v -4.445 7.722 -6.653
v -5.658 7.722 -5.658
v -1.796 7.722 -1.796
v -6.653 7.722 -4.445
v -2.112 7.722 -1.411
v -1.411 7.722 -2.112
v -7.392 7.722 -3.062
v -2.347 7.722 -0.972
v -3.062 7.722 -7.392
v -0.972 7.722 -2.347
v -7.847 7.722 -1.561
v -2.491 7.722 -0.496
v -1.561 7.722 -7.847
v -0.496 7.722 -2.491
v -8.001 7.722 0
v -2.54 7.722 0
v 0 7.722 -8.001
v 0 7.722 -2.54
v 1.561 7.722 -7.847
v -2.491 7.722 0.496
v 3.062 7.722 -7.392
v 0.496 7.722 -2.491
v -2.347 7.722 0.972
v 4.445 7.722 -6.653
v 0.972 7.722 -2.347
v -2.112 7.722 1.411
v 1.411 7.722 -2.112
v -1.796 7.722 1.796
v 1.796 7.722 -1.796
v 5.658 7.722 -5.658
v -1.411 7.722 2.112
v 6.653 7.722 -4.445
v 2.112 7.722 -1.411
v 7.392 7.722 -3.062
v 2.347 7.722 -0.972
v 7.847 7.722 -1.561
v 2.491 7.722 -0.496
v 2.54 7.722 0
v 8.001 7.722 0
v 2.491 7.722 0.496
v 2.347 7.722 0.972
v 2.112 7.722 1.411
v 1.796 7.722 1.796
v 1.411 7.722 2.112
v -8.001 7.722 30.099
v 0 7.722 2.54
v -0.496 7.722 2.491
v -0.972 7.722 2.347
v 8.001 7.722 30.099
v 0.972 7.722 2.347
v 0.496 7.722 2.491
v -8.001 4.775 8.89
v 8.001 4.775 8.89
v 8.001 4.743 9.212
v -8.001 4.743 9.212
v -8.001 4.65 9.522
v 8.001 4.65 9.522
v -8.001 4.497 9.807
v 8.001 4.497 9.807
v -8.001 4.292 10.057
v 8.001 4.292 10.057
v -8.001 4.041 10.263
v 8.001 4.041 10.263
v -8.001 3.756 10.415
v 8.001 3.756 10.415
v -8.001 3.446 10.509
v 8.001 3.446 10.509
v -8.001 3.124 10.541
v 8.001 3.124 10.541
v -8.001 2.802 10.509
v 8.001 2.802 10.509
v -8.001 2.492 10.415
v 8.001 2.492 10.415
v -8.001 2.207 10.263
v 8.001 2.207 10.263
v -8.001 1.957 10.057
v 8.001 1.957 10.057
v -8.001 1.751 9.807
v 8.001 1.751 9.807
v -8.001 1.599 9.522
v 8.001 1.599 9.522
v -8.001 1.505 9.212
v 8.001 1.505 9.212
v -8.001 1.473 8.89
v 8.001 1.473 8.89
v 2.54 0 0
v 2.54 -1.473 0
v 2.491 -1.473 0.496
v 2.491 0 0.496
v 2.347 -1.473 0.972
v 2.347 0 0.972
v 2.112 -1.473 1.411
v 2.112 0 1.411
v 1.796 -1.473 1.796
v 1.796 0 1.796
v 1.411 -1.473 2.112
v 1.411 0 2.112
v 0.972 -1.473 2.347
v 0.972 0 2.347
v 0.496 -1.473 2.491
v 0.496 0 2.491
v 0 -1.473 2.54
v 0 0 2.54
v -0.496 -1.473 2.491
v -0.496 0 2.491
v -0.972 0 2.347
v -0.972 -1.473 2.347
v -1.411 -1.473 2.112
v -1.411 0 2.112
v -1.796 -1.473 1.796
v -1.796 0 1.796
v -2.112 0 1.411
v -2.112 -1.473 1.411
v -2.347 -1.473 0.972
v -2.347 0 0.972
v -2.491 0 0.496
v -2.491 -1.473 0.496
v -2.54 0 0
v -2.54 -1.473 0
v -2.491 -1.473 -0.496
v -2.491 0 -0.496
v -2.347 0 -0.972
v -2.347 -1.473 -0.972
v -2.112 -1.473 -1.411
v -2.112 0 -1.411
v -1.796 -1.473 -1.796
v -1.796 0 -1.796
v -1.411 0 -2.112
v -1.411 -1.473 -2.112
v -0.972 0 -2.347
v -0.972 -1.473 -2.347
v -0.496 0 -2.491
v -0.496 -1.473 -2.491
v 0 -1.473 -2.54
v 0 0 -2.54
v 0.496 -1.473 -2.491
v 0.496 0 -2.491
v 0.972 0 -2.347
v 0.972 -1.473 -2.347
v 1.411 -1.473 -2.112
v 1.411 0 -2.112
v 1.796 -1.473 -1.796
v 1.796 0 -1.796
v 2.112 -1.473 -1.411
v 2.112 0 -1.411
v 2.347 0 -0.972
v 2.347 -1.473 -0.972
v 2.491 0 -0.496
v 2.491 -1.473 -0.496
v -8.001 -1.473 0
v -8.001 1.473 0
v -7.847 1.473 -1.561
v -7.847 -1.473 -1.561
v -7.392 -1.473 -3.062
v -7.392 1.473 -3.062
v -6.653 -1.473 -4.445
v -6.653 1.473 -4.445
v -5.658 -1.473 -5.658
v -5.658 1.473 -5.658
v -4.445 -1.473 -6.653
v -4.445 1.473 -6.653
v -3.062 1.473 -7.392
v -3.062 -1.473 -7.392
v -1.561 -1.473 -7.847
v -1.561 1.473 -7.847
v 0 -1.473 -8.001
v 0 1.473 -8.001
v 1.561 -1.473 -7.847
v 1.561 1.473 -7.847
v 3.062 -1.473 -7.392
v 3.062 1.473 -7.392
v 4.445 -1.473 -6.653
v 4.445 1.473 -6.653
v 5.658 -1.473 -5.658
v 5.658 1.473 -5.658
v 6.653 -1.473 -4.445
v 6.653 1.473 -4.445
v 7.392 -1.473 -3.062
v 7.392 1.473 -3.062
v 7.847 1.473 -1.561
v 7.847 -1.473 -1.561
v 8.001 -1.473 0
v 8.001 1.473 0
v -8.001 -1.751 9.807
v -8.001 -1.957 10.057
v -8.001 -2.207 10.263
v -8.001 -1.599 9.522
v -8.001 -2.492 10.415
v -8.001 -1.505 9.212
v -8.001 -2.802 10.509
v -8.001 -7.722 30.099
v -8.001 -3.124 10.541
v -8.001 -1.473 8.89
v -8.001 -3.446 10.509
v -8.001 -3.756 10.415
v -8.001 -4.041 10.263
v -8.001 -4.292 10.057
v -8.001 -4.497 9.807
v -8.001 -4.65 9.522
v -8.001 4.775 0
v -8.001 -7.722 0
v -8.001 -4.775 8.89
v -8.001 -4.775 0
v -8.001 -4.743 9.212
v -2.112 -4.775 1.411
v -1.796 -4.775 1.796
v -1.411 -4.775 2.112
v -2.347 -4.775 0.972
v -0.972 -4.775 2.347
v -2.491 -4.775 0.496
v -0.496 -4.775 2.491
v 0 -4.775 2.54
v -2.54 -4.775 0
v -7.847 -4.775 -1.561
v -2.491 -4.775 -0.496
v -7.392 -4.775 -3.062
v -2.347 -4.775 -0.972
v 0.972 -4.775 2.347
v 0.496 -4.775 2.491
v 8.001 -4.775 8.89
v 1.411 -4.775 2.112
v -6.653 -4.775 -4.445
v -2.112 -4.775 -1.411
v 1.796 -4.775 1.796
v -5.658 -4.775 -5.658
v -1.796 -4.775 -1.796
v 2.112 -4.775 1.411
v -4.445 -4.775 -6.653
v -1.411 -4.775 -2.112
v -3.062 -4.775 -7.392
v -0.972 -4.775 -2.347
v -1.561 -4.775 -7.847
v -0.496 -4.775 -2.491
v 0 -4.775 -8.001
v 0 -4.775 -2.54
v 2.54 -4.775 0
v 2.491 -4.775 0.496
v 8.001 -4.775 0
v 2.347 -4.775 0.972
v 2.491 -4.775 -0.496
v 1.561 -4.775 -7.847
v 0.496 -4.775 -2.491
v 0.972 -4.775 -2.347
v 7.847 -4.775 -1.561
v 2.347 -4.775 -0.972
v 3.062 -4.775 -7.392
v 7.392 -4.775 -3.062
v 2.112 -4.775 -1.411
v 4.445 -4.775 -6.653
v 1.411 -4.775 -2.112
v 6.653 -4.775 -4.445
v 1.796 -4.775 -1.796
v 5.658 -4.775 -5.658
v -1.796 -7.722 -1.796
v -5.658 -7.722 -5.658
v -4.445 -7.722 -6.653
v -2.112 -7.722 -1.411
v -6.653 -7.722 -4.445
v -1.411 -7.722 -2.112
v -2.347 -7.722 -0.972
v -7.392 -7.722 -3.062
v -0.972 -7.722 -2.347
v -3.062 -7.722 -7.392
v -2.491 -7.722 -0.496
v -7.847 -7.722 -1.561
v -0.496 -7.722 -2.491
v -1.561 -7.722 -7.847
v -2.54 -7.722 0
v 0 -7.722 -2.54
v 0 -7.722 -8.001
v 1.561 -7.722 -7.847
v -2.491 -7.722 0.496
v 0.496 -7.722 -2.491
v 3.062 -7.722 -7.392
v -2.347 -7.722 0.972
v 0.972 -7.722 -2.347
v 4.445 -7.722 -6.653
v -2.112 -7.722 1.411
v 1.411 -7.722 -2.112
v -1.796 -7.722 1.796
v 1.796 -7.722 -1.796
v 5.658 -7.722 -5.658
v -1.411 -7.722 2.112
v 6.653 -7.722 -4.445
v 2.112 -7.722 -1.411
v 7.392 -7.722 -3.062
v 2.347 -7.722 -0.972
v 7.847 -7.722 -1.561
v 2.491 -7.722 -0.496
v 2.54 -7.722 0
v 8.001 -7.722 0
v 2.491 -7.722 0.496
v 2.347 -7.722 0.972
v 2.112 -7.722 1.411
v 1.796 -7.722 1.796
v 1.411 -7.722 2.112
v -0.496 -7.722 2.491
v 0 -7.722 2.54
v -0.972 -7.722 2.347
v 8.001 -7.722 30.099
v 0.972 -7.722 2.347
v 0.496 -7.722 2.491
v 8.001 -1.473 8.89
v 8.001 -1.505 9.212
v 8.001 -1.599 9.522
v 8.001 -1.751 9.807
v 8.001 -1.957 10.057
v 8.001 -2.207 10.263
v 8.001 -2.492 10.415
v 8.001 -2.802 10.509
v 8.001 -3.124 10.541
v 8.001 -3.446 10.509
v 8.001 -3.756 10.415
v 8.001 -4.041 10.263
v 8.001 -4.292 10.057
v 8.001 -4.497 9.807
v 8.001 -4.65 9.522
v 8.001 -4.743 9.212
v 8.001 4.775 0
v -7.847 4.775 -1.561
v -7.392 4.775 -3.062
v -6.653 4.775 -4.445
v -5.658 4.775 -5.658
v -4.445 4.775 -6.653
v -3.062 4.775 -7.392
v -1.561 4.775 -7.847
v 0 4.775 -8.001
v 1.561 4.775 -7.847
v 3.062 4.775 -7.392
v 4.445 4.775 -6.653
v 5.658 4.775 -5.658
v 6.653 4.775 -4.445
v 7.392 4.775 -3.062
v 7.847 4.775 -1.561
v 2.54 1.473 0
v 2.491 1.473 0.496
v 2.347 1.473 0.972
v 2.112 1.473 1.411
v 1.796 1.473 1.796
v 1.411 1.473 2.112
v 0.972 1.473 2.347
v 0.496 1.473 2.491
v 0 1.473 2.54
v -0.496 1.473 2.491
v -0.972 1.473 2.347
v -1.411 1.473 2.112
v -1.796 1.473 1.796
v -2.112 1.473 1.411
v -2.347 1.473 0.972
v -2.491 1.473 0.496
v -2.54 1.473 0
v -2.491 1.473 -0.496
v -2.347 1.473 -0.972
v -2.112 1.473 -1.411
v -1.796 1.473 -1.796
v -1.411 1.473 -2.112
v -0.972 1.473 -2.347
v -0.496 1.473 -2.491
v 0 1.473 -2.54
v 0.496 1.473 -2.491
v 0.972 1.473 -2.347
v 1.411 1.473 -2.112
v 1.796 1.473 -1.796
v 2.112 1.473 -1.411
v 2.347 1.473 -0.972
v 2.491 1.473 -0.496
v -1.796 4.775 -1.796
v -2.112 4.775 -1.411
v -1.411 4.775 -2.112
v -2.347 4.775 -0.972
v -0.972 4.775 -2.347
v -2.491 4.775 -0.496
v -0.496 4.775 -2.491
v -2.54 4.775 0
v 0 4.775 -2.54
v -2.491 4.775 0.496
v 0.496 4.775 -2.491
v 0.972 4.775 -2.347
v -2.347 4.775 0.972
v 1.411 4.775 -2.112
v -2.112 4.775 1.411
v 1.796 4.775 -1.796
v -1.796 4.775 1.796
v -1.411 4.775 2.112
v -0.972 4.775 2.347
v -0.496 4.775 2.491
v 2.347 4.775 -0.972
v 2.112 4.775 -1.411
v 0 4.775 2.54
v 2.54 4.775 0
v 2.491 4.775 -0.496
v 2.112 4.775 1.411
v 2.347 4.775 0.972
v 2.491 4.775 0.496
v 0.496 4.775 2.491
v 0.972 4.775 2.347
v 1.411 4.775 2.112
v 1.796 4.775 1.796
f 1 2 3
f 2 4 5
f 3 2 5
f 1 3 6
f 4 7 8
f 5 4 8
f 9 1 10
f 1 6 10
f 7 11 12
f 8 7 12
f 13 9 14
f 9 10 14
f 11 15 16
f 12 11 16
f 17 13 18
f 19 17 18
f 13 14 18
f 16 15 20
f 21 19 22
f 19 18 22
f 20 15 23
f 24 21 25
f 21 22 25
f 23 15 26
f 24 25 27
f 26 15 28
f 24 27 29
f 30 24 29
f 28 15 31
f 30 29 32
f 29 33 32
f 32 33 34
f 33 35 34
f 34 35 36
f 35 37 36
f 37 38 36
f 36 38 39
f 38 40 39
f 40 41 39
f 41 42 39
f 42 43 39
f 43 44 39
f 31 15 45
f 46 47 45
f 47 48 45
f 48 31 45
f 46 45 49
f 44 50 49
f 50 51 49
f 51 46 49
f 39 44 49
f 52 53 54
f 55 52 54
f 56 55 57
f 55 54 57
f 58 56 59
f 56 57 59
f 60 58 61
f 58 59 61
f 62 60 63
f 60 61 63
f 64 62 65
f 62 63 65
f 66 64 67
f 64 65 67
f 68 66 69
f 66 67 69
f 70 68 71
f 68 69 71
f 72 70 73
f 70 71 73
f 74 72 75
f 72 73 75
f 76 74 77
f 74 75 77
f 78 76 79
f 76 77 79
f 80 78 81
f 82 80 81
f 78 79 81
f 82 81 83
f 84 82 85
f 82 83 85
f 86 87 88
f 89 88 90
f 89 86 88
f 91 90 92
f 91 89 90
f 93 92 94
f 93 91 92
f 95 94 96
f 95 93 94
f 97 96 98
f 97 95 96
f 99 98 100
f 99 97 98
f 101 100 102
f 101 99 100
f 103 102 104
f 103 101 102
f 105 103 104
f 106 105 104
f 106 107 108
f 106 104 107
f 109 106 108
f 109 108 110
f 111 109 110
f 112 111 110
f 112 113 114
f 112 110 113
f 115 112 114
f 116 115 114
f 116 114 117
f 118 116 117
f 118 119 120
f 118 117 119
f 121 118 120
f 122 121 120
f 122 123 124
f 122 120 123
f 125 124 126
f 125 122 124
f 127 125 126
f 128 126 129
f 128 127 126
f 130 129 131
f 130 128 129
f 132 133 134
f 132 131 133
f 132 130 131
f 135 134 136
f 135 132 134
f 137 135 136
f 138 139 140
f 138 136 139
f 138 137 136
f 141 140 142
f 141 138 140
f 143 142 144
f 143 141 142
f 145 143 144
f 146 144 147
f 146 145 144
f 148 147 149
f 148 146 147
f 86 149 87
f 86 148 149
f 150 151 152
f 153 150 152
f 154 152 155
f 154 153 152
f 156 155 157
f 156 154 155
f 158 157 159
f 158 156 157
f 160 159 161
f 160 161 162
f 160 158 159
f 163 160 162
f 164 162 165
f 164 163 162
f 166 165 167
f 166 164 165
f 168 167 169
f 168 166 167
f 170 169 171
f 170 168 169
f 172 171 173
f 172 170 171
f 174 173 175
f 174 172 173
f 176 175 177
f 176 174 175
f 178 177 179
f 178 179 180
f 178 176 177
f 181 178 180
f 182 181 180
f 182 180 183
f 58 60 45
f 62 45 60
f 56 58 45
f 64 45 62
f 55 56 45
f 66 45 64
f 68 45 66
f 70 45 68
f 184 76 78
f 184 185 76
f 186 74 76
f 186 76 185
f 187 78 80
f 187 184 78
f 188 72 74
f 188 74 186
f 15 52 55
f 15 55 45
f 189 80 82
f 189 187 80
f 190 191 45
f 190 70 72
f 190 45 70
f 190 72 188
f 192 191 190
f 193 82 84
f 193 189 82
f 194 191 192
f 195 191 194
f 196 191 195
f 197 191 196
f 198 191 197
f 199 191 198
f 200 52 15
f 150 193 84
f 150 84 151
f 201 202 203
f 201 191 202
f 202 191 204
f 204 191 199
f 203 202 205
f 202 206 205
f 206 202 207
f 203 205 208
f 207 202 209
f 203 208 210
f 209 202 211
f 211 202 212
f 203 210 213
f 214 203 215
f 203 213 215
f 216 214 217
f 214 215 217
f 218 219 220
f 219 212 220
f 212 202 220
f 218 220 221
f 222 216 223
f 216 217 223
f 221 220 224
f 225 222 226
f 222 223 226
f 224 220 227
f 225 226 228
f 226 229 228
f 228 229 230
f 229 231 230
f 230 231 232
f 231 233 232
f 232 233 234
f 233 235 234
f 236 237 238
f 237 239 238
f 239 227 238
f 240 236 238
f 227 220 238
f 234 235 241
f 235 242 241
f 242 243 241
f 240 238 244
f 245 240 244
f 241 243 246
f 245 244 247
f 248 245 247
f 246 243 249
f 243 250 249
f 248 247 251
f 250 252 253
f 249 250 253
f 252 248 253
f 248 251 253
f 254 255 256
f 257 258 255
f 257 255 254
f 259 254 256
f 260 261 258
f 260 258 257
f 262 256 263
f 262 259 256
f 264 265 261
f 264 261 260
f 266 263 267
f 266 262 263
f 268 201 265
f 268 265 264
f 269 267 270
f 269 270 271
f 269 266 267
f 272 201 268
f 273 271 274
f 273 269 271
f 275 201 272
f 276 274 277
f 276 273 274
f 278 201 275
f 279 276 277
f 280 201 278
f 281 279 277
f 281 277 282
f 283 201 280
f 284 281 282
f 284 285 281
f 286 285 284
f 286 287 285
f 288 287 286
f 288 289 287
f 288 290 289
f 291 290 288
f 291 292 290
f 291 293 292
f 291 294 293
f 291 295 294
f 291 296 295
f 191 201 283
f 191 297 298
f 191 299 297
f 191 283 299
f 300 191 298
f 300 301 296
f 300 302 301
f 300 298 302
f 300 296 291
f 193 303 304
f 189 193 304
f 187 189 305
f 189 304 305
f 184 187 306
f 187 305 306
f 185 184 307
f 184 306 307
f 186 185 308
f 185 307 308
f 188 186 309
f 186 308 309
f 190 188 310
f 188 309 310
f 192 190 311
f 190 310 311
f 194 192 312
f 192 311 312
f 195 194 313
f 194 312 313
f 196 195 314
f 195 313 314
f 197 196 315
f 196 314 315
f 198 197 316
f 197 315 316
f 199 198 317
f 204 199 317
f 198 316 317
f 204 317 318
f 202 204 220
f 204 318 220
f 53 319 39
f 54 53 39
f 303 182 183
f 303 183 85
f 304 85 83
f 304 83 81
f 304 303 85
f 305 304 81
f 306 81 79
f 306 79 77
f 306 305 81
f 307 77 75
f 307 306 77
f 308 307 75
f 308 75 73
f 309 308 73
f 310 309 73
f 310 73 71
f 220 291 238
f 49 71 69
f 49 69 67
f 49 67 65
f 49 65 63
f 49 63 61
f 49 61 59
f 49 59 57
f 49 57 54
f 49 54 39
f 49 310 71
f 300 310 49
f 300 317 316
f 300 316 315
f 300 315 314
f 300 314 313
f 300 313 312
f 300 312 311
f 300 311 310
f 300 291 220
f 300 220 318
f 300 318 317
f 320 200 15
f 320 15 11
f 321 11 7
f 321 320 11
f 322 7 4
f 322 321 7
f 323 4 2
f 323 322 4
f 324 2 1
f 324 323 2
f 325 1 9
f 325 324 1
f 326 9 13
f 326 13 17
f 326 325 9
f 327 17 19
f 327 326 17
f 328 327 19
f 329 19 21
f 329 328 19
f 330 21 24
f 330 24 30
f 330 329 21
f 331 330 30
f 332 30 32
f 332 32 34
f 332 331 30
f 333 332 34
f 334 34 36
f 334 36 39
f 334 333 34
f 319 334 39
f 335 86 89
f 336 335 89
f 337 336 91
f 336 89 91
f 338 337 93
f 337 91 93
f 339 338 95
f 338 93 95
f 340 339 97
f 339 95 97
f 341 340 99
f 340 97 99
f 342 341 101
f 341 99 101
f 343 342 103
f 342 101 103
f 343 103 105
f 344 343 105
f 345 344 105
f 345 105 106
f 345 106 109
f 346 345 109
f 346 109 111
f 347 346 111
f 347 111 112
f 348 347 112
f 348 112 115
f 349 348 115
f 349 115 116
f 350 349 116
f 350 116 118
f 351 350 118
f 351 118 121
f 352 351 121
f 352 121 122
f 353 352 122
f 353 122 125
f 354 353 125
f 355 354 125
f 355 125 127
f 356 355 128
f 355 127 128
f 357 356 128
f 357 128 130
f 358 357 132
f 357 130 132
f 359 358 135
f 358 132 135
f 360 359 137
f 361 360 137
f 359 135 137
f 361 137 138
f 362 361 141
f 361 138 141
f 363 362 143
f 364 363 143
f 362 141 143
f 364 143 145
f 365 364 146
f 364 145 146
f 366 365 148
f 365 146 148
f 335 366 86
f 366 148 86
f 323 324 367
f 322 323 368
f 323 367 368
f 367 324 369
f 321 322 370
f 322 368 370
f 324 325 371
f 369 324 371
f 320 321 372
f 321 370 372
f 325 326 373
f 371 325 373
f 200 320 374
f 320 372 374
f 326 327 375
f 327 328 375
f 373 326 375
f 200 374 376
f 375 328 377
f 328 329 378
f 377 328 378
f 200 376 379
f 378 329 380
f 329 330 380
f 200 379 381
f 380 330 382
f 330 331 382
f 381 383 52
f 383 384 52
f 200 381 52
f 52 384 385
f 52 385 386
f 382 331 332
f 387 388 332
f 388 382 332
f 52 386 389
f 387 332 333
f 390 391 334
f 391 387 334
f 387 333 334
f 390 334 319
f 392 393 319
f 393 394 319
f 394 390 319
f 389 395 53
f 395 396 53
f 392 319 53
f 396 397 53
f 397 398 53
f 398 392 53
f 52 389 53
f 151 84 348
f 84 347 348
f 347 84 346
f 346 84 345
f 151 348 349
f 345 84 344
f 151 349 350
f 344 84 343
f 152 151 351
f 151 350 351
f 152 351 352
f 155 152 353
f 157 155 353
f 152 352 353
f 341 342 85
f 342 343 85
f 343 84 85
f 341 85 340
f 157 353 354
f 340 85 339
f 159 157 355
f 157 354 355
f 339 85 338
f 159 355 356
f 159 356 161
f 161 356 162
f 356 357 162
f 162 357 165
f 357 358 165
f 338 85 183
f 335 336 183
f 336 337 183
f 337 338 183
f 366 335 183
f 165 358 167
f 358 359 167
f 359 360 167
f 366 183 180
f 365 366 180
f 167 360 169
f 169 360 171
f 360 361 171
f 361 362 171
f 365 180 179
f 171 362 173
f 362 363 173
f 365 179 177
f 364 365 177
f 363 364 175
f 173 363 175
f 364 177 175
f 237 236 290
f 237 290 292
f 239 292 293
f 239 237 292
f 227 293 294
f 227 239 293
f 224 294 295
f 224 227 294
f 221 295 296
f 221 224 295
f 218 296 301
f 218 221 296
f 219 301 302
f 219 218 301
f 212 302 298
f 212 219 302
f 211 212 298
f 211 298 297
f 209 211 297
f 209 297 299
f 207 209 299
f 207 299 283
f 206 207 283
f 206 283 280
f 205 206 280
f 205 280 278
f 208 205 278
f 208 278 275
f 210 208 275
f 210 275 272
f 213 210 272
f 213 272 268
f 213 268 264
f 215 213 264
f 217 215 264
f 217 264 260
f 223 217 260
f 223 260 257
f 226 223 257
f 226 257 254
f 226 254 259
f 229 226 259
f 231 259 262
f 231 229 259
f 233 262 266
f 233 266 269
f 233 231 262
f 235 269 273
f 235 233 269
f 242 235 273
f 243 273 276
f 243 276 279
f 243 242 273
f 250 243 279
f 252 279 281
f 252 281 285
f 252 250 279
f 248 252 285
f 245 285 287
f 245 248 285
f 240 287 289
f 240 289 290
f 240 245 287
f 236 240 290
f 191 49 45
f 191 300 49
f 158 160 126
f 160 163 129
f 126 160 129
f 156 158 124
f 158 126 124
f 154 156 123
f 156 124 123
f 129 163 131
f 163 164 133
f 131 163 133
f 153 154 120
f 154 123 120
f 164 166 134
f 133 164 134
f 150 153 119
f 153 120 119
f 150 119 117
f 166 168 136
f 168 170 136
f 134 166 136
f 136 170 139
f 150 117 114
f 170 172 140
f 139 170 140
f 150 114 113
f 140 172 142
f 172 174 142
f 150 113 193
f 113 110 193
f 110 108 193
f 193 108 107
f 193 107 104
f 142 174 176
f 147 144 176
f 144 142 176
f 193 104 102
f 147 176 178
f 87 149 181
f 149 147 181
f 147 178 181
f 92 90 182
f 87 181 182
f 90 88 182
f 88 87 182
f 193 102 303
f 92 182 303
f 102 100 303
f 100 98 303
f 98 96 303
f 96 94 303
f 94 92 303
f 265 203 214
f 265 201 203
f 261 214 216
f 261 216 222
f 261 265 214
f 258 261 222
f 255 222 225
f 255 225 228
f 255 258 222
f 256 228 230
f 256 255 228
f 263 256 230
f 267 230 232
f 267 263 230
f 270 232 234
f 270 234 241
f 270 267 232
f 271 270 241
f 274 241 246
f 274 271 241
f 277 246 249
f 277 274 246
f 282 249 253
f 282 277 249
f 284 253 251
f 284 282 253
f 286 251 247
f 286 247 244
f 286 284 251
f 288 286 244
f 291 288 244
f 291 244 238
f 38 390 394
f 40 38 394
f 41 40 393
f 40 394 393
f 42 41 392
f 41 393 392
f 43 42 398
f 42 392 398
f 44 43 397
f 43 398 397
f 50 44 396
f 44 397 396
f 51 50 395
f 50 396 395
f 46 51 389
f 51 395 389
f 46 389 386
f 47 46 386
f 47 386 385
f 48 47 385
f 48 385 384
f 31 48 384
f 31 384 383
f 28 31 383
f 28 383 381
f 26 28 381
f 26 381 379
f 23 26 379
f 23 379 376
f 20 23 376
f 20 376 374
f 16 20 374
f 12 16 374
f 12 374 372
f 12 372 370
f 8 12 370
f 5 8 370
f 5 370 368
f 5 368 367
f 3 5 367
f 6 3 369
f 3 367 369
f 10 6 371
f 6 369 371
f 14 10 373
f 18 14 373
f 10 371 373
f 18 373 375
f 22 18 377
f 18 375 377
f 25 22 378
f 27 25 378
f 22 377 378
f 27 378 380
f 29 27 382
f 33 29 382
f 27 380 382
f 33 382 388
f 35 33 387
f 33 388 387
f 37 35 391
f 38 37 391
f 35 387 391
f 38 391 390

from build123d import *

# Parameters (mm, degrees)
F0_R          = 2.54
F1_DEPTH      = 7.7216
F1_DEPTH_BACK = 7.7216
F3_DEPTH      = 8.002
F3_DEPTH_BACK = 8.002


with BuildPart() as f1:
    # F0 (on Front) → F1 (new body, two sides)
    with BuildSketch(Plane.XZ) as f1_sk:
        with BuildLine():
            Line((-8.001, 30.099), (-8.001, 0))
            ThreePointArc((-8.001, 0), (0, -8.001), (8.001, 0))
            Line((8.001, 0), (8.001, 30.099))
            Line((8.001, 30.099), (-8.001, 30.099))
        make_face()
        Circle(F0_R, mode=Mode.SUBTRACT)
    extrude(amount=F1_DEPTH)
    extrude(f1_sk.sketch, amount=-F1_DEPTH_BACK)

    # F2 (on Right) → F3 (cut, two sides)
    with BuildSketch(Plane.YZ) as f3_sk:
        with BuildLine():
            Line((1.4732, 8.89), (1.4732, -10.7479624593))
            Line((1.4732, -10.7479624593), (4.7752, -10.7479624593))
            Line((4.7752, -10.7479624593), (4.7752, 8.89))
            ThreePointArc((4.7752, 8.89), (3.1242, 10.541), (1.4732, 8.89))
        make_face()
        with BuildLine():
            Line((-4.7752, 8.89), (-4.7752, -10.7479624593))
            Line((-4.7752, -10.7479624593), (-1.4732, -10.7479624593))
            Line((-1.4732, -10.7479624593), (-1.4732, 8.89))
            ThreePointArc((-1.4732, 8.89), (-3.1242, 10.541), (-4.7752, 8.89))
        make_face()
    extrude(amount=-F3_DEPTH, mode=Mode.SUBTRACT)
    extrude(f3_sk.sketch, amount=F3_DEPTH_BACK, mode=Mode.SUBTRACT)


solid = f1.part
